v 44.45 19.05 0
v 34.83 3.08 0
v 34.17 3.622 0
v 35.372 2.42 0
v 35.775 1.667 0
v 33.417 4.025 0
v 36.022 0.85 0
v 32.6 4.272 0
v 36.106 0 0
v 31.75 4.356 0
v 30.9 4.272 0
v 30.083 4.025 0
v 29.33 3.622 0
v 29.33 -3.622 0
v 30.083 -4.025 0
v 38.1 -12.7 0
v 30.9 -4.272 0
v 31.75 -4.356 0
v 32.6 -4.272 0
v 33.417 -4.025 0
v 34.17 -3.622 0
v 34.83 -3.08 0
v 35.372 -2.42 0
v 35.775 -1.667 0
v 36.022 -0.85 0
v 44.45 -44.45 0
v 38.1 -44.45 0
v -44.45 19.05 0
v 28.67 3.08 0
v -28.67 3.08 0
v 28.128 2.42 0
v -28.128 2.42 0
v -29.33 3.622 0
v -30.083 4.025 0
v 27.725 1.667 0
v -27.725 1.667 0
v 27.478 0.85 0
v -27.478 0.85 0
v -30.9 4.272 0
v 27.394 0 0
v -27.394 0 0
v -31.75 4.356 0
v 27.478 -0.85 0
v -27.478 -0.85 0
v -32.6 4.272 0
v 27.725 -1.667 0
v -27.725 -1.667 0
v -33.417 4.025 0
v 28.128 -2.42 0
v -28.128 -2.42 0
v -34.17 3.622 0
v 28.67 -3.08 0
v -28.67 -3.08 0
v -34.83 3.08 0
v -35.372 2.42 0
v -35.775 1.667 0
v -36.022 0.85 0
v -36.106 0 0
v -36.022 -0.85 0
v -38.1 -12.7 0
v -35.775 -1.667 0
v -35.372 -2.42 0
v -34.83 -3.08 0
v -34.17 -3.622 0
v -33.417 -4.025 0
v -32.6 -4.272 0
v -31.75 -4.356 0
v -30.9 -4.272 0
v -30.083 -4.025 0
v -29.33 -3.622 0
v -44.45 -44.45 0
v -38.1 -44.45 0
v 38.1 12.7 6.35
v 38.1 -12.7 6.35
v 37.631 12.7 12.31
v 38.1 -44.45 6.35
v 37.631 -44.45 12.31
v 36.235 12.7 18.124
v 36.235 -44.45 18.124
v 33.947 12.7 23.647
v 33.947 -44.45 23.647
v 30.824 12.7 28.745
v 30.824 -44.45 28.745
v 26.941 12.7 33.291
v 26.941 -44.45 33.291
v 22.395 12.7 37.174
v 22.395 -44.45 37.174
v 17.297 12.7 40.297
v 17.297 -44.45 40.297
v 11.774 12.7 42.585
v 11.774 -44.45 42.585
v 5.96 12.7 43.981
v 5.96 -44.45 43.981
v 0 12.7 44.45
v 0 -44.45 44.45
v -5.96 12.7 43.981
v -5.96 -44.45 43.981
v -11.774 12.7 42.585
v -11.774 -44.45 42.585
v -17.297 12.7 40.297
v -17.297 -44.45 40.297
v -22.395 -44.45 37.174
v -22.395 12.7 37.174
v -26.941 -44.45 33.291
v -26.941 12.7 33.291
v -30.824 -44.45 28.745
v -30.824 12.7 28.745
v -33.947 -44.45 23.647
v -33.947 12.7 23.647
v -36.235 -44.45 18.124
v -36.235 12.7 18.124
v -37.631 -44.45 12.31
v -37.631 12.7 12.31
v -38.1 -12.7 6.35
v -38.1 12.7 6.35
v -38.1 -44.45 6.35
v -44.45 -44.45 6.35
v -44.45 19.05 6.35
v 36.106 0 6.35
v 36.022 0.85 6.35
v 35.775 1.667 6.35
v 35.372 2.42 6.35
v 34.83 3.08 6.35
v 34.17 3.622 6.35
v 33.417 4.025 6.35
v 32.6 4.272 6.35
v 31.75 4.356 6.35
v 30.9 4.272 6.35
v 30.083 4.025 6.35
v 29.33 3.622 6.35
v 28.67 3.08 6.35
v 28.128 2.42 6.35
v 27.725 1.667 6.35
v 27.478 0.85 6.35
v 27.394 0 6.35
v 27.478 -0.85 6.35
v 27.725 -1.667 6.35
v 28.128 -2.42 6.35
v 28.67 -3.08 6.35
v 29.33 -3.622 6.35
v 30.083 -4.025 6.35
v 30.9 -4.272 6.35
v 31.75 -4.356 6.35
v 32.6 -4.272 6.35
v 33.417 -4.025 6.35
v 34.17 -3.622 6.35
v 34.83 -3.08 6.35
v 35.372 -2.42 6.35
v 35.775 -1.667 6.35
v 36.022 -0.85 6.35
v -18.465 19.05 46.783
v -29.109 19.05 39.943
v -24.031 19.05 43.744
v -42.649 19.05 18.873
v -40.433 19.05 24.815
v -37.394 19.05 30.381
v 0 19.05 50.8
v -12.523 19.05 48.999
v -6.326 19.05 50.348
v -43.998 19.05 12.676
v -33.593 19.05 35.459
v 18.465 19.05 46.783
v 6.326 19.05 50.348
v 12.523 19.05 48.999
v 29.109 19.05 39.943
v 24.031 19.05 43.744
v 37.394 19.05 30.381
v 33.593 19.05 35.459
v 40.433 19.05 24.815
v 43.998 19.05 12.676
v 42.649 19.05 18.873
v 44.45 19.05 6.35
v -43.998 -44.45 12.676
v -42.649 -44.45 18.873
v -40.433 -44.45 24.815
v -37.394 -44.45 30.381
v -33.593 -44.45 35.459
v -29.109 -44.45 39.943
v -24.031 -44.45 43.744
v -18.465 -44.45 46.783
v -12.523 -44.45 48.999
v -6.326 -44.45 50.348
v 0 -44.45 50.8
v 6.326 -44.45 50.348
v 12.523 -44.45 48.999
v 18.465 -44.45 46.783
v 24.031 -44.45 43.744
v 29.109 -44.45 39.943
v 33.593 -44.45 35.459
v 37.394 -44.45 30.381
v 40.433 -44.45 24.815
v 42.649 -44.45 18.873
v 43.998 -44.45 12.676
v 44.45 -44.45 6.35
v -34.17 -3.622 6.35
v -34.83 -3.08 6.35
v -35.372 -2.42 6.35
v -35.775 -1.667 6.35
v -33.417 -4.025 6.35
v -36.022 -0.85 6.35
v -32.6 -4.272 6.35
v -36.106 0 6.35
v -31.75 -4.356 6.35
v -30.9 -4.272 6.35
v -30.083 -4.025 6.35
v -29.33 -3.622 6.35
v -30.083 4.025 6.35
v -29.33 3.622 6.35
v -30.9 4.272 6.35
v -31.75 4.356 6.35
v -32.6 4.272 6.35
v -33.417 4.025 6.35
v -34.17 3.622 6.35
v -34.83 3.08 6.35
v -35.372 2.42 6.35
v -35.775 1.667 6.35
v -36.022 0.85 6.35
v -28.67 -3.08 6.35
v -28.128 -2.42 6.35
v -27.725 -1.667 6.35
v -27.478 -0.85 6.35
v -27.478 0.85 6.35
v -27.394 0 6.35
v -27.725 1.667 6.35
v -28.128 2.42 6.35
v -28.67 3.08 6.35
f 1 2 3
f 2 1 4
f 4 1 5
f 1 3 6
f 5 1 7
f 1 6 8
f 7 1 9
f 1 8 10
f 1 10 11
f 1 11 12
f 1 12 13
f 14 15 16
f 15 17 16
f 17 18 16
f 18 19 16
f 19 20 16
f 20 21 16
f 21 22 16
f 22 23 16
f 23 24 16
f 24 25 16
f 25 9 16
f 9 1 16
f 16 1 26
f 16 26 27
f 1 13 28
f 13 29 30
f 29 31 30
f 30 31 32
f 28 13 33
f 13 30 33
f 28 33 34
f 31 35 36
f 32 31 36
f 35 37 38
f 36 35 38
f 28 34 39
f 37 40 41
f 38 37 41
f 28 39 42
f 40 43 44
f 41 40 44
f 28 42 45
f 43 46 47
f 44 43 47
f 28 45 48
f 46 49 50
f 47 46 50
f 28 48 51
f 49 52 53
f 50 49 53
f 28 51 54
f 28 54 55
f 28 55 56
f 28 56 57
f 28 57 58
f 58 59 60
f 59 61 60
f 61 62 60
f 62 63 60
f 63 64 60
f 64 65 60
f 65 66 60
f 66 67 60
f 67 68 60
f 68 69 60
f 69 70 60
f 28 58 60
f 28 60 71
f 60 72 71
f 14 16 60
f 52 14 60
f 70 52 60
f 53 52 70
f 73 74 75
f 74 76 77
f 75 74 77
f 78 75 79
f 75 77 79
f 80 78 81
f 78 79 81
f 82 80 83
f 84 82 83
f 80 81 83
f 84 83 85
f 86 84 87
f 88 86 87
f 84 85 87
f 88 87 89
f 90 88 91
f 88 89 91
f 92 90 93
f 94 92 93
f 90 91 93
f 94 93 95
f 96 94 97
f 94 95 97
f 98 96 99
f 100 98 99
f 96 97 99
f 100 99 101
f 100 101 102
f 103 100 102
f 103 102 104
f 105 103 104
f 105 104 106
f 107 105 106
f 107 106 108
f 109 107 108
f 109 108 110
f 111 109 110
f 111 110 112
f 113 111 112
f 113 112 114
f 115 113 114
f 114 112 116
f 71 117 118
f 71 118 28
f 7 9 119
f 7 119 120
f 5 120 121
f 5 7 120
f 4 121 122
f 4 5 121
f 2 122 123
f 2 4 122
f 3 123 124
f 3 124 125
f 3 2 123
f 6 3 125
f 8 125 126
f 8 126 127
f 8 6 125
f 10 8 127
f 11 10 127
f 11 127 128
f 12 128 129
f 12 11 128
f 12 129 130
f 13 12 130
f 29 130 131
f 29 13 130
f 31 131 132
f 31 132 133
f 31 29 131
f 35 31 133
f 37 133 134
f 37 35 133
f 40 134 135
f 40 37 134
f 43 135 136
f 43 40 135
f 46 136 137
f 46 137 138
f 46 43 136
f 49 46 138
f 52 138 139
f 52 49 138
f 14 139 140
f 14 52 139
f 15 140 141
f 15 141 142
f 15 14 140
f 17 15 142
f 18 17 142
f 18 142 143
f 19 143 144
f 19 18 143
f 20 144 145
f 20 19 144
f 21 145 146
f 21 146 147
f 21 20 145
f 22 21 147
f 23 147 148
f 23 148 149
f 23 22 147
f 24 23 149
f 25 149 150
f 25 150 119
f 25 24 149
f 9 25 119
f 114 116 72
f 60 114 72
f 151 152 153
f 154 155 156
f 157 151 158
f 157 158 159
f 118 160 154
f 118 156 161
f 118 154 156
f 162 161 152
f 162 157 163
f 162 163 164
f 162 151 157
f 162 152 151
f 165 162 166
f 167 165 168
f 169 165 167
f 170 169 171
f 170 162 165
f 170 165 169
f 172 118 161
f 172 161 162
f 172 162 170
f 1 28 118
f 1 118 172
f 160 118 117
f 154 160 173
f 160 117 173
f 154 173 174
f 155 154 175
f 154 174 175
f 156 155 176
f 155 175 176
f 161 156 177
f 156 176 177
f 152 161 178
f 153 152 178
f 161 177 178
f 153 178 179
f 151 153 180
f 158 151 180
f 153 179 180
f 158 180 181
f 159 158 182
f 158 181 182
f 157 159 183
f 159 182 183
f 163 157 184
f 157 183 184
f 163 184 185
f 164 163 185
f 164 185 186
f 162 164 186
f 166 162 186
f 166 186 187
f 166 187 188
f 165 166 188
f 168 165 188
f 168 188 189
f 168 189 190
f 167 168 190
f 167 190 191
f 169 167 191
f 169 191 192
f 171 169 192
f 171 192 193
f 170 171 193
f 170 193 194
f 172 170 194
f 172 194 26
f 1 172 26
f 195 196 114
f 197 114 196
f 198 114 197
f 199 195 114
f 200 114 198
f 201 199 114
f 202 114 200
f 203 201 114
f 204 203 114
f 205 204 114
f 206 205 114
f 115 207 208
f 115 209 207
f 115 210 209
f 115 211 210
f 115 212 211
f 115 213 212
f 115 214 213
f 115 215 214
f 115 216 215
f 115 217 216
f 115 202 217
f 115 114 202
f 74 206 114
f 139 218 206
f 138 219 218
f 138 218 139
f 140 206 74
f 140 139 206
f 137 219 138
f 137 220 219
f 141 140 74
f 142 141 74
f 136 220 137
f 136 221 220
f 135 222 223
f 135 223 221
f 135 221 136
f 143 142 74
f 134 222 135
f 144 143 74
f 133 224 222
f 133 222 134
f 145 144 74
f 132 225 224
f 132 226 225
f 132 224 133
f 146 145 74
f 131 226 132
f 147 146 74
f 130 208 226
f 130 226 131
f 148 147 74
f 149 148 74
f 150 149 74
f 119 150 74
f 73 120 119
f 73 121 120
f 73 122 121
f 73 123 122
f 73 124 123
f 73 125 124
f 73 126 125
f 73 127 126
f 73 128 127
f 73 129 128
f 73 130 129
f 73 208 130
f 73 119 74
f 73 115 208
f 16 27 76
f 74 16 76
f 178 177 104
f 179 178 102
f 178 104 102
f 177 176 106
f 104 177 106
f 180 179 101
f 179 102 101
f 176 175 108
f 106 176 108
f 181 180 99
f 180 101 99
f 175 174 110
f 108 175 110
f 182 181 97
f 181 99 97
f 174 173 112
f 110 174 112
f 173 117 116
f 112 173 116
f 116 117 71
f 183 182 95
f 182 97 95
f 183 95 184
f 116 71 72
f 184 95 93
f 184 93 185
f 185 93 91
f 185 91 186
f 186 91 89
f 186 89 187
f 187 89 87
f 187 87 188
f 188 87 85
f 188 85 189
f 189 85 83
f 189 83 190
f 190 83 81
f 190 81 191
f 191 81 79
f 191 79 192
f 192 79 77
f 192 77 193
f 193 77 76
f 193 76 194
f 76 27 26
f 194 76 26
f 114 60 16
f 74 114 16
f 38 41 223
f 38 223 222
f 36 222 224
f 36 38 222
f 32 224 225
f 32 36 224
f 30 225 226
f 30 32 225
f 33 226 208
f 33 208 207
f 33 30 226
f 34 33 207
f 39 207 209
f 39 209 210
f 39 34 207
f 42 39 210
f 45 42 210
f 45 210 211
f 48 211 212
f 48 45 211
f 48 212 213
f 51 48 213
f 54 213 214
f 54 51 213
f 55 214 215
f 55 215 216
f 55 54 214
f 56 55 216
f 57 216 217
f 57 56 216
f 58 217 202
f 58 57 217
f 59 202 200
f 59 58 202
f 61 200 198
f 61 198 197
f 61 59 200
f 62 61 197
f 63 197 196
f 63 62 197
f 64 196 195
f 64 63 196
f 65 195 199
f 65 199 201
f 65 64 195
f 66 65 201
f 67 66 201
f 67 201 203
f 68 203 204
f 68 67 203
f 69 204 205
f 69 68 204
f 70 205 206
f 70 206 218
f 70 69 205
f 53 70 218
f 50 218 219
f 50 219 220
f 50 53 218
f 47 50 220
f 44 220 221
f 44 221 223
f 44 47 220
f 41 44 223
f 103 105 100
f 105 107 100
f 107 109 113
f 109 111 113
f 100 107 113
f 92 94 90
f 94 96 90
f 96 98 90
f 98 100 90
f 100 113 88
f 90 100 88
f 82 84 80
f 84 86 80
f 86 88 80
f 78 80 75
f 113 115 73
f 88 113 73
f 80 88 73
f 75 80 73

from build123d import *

# Parameters (mm, degrees)
SKETCH1_W           = 88.9
SKETCH1_H           = 25.4
SKETCH1_R           = 4.3561
BOSS_EXTRUDE1_DEPTH = 6.35
SKETCH2_W           = 88.9
SKETCH2_H           = 6.35
BOSS_EXTRUDE2_DEPTH = 6.35
BOSS_EXTRUDE3_START = -63.5
BOSS_EXTRUDE3_DEPTH = 63.5


with BuildPart() as part:
    # Sketch1 → Boss-Extrude1 (new body)
    with BuildSketch(Plane.XY):
        Rectangle(SKETCH1_W, SKETCH1_H)
        with Locations((-31.75, 0)):
            Circle(SKETCH1_R, mode=Mode.SUBTRACT)
        with Locations((31.75, 0)):
            Circle(SKETCH1_R, mode=Mode.SUBTRACT)
    extrude(amount=BOSS_EXTRUDE1_DEPTH)

    # Sketch2 → Boss-Extrude2 (add)
    with BuildSketch(Plane(origin=(0, 12.7, 0), x_dir=(1, 0, 0), z_dir=(0, 1, 0))):
        with Locations((0, -3.175)):
            Rectangle(SKETCH2_W, SKETCH2_H)
        with BuildLine():
            ThreePointArc((-44.45, -6.35), (0, -50.8), (44.45, -6.35))
            Line((44.45, -6.35), (-44.45, -6.35))
        make_face()
    extrude(amount=BOSS_EXTRUDE2_DEPTH)

    # Sketch3 → Boss-Extrude3 (add)
    with BuildSketch(Plane(origin=(0, 19.05, 0), x_dir=(1, 0, 0), z_dir=(0, 1, 0)).offset(BOSS_EXTRUDE3_START)):
        with BuildLine():
            ThreePointArc((-44.45, -6.35), (0, -50.8), (44.45, -6.35))
            Line((44.45, -6.35), (44.45, 0))
            Line((44.45, 0), (38.1, 0))
            Line((38.1, 0), (38.1, -6.35))
            ThreePointArc((38.1, -6.35), (0, -44.45), (-38.1, -6.35))
            Line((-38.1, -6.35), (-38.1, 0))
            Line((-38.1, 0), (-44.45, 0))
            Line((-44.45, 0), (-44.45, -6.35))
        make_face()
    extrude(amount=BOSS_EXTRUDE3_DEPTH)


solid = part.part
